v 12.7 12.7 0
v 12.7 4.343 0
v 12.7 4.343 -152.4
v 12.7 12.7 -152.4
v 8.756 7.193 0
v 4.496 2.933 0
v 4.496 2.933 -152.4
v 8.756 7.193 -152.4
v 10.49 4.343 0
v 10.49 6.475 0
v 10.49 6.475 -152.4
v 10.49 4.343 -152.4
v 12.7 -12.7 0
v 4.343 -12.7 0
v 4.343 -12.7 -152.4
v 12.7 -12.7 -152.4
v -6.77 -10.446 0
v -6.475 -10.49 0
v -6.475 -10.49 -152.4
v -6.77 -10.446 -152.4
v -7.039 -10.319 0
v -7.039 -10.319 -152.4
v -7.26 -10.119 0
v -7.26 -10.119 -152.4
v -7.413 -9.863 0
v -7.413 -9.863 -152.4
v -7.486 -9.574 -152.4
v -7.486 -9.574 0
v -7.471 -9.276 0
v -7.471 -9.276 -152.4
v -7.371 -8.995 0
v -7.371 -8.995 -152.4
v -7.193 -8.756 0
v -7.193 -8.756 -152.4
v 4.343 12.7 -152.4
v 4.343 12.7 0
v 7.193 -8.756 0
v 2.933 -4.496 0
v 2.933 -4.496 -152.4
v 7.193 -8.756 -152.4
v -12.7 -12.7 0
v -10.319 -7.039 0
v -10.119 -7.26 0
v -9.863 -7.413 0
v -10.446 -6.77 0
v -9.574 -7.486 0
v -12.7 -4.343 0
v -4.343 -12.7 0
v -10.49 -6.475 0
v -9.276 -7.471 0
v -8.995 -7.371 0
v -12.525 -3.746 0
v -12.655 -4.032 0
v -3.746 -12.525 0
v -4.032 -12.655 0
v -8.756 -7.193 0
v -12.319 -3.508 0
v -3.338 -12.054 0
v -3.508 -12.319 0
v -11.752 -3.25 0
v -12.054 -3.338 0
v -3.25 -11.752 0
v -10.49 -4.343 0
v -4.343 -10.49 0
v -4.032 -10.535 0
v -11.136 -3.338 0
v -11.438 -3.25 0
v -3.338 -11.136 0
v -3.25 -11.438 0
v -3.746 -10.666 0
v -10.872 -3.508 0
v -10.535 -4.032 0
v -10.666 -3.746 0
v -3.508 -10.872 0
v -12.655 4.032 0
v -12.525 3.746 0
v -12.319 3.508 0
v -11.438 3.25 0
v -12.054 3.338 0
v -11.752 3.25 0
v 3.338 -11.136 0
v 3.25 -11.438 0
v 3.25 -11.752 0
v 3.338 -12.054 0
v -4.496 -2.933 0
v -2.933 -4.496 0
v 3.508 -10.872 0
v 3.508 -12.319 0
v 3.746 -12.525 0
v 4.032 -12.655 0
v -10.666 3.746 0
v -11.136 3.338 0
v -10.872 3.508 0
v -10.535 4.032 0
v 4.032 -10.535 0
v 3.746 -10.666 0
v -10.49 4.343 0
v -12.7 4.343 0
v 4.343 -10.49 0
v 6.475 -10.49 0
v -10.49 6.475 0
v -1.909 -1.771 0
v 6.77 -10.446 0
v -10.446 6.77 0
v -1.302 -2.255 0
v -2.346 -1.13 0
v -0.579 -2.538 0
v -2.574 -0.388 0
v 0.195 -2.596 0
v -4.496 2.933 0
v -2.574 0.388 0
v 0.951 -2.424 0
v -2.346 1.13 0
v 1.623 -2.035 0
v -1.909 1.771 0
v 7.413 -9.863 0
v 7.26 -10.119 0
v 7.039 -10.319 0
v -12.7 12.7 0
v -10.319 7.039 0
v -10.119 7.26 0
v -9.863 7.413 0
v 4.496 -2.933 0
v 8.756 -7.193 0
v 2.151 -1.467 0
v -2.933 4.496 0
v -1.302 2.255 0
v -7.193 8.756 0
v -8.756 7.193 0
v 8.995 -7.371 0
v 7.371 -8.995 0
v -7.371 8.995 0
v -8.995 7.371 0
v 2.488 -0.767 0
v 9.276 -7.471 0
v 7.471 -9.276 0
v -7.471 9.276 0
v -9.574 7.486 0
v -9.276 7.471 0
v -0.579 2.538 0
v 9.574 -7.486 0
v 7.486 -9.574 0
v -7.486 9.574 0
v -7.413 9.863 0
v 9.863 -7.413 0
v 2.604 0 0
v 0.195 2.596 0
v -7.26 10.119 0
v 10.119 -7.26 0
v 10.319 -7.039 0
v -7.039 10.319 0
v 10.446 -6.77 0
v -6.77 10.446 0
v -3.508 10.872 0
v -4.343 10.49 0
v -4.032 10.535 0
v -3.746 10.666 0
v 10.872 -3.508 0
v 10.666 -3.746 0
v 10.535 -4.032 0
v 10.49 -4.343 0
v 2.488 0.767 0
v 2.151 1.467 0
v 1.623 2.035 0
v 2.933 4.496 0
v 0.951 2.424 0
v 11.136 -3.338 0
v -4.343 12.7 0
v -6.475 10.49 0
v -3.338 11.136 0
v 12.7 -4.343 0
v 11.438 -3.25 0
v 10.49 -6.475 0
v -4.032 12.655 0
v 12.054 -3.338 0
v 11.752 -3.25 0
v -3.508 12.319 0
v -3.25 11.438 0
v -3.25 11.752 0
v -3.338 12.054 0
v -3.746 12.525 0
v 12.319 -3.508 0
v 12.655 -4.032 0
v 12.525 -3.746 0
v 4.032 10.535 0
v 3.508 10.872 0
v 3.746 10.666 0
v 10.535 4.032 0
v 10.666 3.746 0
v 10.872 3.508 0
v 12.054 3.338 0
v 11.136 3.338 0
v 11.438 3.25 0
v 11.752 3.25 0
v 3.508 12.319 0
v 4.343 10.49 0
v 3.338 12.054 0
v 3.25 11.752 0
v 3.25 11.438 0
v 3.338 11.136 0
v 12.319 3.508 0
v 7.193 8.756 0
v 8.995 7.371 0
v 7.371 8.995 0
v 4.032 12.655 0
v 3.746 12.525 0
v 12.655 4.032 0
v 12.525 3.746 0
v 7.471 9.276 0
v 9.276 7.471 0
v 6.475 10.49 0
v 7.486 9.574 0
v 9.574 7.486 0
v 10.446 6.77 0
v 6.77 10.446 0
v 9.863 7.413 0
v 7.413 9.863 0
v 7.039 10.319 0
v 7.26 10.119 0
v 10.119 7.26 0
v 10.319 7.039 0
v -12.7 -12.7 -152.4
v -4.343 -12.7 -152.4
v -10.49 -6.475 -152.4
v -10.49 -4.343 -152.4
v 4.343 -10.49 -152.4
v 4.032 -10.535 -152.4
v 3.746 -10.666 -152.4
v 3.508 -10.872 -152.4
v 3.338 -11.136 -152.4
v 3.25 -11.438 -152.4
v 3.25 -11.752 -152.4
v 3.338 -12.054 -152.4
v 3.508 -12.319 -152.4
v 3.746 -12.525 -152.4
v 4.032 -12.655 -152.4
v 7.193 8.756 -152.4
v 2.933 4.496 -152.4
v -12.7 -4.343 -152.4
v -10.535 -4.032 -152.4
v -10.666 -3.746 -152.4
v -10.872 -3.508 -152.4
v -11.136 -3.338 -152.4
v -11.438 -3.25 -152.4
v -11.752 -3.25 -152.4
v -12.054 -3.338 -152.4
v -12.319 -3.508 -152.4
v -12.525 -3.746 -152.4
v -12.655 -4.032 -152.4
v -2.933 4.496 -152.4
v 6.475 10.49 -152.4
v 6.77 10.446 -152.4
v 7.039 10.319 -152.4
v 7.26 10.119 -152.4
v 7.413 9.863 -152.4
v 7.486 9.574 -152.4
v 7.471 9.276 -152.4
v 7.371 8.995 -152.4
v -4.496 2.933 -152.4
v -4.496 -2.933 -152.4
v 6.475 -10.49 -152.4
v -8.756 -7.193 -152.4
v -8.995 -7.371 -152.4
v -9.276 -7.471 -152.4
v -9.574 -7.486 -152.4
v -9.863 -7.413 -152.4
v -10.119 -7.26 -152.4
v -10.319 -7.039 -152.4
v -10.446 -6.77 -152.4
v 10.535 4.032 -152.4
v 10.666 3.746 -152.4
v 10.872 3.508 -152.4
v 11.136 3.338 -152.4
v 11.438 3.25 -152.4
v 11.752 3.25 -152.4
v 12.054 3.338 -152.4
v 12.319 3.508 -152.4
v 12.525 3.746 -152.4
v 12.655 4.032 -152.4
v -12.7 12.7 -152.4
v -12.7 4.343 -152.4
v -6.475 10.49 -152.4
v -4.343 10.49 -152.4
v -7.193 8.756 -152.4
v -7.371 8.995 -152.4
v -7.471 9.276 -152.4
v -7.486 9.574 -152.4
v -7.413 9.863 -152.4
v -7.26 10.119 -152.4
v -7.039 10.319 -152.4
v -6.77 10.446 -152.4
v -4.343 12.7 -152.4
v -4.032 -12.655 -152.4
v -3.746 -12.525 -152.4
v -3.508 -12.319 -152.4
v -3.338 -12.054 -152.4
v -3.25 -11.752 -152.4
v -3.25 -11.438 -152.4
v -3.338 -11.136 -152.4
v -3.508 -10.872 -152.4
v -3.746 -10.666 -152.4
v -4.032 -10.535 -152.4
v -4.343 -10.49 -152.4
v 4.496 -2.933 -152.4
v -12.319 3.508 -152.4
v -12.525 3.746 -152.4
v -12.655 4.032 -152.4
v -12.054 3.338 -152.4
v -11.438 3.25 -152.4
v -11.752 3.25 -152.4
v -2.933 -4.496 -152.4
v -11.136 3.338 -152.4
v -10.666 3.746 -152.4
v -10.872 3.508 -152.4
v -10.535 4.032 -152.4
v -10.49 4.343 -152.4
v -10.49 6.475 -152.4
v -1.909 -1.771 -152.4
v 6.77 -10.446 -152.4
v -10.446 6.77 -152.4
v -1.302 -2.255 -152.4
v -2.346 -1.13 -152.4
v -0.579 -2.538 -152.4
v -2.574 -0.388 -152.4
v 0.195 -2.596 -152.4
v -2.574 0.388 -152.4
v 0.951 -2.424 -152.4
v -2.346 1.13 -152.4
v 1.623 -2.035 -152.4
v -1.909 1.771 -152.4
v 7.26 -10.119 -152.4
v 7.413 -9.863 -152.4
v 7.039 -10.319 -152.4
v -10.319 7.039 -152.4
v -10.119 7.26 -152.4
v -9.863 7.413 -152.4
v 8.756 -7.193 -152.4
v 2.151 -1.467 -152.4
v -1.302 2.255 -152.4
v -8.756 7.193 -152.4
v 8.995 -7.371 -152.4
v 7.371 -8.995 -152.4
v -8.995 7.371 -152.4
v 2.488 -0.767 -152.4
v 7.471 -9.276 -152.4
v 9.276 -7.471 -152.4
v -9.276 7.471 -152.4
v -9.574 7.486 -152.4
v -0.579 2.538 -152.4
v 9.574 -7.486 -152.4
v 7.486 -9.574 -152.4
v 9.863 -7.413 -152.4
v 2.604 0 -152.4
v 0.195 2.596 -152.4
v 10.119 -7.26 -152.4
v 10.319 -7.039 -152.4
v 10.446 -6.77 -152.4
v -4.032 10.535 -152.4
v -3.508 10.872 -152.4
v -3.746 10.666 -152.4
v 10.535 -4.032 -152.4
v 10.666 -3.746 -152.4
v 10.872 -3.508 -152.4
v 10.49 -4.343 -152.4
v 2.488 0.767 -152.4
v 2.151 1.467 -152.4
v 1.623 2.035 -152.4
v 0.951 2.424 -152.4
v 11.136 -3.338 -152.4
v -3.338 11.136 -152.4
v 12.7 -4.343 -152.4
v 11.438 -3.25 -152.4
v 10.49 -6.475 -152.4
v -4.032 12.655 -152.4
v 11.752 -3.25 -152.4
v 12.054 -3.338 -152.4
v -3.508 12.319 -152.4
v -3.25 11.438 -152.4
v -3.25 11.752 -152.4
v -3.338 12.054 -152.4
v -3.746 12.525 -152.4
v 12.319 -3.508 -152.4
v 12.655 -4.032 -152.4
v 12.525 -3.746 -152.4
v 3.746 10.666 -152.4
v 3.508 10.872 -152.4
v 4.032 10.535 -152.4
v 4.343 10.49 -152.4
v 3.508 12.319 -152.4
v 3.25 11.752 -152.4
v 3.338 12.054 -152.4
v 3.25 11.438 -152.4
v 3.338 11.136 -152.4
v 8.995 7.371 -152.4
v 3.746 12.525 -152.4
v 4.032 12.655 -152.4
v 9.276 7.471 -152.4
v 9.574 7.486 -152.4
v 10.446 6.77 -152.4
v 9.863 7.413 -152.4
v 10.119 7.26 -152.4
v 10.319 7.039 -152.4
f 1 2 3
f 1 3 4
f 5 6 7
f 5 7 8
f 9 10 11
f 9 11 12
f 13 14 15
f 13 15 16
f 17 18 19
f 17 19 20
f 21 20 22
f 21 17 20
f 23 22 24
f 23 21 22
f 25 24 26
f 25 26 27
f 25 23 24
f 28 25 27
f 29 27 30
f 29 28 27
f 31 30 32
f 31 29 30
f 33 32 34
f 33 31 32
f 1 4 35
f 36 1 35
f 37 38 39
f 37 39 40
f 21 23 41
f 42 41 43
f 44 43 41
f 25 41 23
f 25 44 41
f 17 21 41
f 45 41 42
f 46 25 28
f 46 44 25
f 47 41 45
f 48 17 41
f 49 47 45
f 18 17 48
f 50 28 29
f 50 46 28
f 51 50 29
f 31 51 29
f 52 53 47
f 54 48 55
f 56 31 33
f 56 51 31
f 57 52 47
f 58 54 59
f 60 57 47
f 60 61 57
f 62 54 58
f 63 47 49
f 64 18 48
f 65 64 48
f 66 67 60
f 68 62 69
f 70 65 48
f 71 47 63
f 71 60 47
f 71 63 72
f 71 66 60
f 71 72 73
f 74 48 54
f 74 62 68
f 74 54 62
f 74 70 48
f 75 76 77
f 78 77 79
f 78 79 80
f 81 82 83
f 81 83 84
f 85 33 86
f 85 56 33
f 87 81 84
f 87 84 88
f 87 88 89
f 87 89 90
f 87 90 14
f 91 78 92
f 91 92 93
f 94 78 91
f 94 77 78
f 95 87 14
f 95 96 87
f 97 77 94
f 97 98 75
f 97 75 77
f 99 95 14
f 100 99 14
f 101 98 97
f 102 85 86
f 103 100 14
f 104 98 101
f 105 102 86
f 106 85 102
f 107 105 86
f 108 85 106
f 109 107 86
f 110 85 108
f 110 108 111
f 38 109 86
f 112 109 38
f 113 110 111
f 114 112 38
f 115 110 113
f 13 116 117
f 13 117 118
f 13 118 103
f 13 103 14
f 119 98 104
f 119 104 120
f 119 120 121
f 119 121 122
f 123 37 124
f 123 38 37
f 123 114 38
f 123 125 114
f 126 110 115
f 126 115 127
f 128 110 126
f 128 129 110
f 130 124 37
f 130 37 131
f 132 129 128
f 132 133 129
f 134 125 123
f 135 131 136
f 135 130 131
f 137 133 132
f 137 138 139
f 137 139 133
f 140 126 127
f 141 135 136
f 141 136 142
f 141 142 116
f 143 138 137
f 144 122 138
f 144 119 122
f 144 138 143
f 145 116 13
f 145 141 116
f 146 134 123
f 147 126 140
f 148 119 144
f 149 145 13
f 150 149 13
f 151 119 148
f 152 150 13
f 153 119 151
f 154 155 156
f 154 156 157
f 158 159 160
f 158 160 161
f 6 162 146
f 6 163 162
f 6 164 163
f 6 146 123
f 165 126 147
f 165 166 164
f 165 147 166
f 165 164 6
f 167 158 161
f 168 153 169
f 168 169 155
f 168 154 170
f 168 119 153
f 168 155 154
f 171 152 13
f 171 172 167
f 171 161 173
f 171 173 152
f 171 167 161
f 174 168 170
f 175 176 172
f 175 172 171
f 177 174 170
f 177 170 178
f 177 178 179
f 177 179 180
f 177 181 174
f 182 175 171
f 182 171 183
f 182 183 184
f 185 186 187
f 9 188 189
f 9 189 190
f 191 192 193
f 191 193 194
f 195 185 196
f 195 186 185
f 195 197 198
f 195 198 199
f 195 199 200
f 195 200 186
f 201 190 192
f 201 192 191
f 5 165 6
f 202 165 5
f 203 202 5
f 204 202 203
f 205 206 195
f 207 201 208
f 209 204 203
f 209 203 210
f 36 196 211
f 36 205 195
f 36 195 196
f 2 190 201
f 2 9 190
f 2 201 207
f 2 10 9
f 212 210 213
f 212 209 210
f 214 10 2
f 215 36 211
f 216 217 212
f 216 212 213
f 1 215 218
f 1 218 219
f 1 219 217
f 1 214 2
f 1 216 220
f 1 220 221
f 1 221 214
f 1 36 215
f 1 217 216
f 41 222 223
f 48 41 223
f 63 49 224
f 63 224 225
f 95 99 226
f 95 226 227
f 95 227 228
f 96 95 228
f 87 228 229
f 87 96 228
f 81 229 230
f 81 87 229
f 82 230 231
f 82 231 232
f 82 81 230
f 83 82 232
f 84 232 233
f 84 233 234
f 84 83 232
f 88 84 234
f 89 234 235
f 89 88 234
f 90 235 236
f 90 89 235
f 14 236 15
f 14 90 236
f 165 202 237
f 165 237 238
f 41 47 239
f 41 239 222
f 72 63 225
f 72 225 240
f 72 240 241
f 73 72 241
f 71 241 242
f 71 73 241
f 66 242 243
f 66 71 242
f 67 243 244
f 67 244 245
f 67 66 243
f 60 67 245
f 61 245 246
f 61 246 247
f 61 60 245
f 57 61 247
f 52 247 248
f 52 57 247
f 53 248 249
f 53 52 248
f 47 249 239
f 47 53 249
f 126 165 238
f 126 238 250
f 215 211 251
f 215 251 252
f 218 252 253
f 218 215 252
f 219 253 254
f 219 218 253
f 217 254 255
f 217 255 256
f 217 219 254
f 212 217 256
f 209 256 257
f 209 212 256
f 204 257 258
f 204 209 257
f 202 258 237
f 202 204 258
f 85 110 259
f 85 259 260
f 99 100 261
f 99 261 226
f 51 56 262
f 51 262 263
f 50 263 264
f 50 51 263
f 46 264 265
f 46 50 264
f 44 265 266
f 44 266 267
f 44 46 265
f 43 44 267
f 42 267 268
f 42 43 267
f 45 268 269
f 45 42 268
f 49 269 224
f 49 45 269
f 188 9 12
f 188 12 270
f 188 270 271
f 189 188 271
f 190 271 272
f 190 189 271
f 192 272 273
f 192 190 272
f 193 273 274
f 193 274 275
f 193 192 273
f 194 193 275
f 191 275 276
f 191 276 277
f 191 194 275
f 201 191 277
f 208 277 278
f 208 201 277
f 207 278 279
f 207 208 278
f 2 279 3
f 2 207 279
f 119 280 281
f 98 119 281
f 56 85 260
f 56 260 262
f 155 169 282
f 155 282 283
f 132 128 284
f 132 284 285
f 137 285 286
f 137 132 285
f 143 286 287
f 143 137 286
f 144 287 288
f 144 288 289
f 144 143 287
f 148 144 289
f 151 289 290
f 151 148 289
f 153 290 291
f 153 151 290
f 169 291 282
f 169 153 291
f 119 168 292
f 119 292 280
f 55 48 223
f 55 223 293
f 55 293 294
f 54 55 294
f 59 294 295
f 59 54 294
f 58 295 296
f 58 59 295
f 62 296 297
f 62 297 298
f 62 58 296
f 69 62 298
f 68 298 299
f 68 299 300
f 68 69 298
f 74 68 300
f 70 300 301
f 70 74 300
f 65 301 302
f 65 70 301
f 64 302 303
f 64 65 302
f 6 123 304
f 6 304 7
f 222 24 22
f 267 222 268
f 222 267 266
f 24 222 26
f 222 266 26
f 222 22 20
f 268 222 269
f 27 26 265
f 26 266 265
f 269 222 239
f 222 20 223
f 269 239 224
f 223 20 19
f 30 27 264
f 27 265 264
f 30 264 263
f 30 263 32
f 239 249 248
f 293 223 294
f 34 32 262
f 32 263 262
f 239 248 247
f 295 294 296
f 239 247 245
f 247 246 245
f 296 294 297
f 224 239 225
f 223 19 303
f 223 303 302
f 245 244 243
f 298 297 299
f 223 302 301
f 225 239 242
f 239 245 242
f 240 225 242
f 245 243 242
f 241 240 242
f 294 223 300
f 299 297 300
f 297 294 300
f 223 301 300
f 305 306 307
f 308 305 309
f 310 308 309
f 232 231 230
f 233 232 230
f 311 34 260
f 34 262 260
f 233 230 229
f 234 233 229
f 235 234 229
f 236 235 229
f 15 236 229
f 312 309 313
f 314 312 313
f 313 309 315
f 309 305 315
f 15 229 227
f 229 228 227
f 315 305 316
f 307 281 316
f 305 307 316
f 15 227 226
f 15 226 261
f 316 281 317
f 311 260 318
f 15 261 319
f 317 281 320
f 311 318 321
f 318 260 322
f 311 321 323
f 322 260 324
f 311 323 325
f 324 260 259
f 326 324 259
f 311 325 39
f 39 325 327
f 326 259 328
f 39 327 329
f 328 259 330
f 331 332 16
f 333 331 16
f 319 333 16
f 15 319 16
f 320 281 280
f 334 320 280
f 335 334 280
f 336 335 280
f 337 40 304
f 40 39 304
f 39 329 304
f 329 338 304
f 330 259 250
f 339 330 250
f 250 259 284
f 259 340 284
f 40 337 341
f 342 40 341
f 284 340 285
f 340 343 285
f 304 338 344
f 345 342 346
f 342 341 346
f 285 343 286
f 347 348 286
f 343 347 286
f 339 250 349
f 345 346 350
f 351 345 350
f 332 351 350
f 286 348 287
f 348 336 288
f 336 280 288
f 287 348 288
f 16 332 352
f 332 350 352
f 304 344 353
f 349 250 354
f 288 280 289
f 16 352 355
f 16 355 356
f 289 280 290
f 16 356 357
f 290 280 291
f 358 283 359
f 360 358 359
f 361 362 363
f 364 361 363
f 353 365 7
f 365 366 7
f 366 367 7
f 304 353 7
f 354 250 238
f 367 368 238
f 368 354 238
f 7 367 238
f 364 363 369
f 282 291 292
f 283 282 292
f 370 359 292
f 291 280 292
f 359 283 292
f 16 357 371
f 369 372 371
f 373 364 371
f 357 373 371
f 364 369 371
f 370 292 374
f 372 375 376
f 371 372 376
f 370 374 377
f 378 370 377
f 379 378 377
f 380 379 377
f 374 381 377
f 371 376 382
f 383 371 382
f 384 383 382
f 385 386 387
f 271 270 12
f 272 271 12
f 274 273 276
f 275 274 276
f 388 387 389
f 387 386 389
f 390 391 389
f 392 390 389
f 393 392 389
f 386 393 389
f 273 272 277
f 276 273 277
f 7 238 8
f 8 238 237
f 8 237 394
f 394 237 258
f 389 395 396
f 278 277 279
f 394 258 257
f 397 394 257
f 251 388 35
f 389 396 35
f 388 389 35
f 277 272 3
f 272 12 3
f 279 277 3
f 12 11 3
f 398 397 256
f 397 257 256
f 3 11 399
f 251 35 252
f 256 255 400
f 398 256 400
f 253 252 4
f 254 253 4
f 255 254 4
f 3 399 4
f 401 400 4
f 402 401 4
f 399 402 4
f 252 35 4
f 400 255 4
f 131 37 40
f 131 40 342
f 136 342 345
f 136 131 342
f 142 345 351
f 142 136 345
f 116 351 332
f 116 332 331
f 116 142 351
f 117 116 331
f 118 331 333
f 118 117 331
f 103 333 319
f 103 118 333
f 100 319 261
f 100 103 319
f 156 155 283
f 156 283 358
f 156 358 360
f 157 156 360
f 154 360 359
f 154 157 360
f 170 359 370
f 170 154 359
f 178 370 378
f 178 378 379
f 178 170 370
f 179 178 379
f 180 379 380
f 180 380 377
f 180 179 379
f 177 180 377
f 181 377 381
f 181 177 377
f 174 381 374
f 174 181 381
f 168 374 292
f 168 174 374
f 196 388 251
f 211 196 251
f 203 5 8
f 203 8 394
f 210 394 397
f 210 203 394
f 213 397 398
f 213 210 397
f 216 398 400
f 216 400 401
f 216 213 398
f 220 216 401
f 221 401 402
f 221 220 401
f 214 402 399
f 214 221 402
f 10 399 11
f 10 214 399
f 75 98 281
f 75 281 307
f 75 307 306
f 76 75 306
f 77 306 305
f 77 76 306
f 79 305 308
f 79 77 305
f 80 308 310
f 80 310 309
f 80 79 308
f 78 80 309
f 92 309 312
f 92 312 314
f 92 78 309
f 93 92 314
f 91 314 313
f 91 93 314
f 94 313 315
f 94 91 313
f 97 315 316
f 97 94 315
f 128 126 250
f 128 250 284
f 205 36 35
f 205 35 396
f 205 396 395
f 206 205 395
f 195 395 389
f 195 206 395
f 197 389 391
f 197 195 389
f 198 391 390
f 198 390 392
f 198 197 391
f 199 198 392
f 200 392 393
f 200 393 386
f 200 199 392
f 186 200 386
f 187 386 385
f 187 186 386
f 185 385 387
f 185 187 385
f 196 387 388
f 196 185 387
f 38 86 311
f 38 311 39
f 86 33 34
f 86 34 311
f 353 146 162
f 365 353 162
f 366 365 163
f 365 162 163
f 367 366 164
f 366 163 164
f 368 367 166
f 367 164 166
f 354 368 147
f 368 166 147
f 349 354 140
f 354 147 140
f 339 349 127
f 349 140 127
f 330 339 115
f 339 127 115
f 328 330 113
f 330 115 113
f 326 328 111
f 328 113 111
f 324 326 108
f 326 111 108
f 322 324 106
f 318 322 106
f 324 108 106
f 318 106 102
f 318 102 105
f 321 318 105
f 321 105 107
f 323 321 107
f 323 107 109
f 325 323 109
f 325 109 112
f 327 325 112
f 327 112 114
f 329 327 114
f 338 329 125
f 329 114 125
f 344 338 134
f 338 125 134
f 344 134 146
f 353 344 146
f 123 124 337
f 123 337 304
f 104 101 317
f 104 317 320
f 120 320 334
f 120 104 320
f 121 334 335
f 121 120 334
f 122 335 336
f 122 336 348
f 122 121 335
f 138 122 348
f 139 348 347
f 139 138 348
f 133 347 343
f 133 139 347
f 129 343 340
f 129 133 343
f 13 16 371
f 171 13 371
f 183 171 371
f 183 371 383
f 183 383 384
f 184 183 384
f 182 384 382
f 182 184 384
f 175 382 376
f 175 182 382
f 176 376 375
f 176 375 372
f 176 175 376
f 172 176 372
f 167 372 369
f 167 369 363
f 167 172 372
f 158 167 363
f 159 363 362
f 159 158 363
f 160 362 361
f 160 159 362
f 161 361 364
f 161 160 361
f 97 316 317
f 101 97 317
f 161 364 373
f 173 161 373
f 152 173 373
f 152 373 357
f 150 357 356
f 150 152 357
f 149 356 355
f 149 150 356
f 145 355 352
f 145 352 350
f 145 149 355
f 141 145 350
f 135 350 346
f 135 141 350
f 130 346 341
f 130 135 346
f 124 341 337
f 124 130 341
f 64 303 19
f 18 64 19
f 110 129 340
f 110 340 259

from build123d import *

# Parameters (mm, degrees)
SKETCH1_R           = 2.6035
BOSS_EXTRUDE1_DEPTH = 152.4


with BuildPart() as part:
    # Sketch1 → Boss-Extrude1 (new body)
    with BuildSketch(Plane.XY):
        with BuildLine():
            Line((-12.7, -12.7), (-4.343399971, -12.7))
            ThreePointArc((-4.343399971, -12.7), (-3.238499971, -11.5951), (-4.343399971, -10.4902))
            Line((-4.343399971, -10.4902), (-6.474794456, -10.4902))
            ThreePointArc((-6.474794456, -10.4902), (-7.413456061, -9.863006367), (-7.193214945, -8.75577951))
            Line((-7.193214945, -8.75577951), (-2.933235435, -4.4958))
            Line((-2.933235435, -4.4958), (2.933235435, -4.4958))
            Line((2.933235435, -4.4958), (7.193214945, -8.75577951))
            ThreePointArc((7.193214945, -8.75577951), (7.413456061, -9.863006367), (6.474794456, -10.4902))
            Line((6.474794456, -10.4902), (4.3434, -10.4902))
            ThreePointArc((4.3434, -10.4902), (3.2385, -11.5951), (4.3434, -12.7))
            Line((4.3434, -12.7), (12.7, -12.7))
            Line((12.7, -12.7), (12.7, -4.343399971))
            ThreePointArc((12.7, -4.343399971), (11.5951, -3.238499971), (10.4902, -4.343399971))
            Line((10.4902, -4.343399971), (10.4902, -6.474794456))
            ThreePointArc((10.4902, -6.474794456), (9.863006367, -7.413456061), (8.75577951, -7.193214945))
            Line((8.75577951, -7.193214945), (4.4958, -2.933235435))
            Line((4.4958, -2.933235435), (4.4958, 2.933235435))
            Line((4.4958, 2.933235435), (8.75577951, 7.193214945))
            ThreePointArc((8.75577951, 7.193214945), (9.863006367, 7.413456061), (10.4902, 6.474794456))
            Line((10.4902, 6.474794456), (10.4902, 4.3434))
            ThreePointArc((10.4902, 4.3434), (11.5951, 3.2385), (12.7, 4.3434))
            Line((12.7, 4.3434), (12.7, 12.7))
            Line((12.7, 12.7), (4.343399971, 12.7))
            ThreePointArc((4.343399971, 12.7), (3.238499971, 11.5951), (4.343399971, 10.4902))
            Line((4.343399971, 10.4902), (6.474794456, 10.4902))
            ThreePointArc((6.474794456, 10.4902), (7.413456061, 9.863006367), (7.193214945, 8.75577951))
            Line((7.193214945, 8.75577951), (2.933235435, 4.4958))
            Line((2.933235435, 4.4958), (-2.933235435, 4.4958))
            Line((-2.933235435, 4.4958), (-7.193214945, 8.75577951))
            ThreePointArc((-7.193214945, 8.75577951), (-7.413456061, 9.863006367), (-6.474794456, 10.4902))
            Line((-6.474794456, 10.4902), (-4.3434, 10.4902))
            ThreePointArc((-4.3434, 10.4902), (-3.2385, 11.5951), (-4.3434, 12.7))
            Line((-4.3434, 12.7), (-12.7, 12.7))
            Line((-12.7, 12.7), (-12.7, 4.343399971))
            ThreePointArc((-12.7, 4.343399971), (-11.5951, 3.238499971), (-10.4902, 4.343399971))
            Line((-10.4902, 4.343399971), (-10.4902, 6.474794456))
            ThreePointArc((-10.4902, 6.474794456), (-9.863006367, 7.413456061), (-8.75577951, 7.193214945))
            Line((-8.75577951, 7.193214945), (-4.4958, 2.933235435))
            Line((-4.4958, 2.933235435), (-4.4958, -2.933235435))
            Line((-4.4958, -2.933235435), (-8.75577951, -7.193214945))
            ThreePointArc((-8.75577951, -7.193214945), (-9.863006367, -7.413456061), (-10.4902, -6.474794456))
            Line((-10.4902, -6.474794456), (-10.4902, -4.3434))
            ThreePointArc((-10.4902, -4.3434), (-11.5951, -3.2385), (-12.7, -4.3434))
            Line((-12.7, -4.3434), (-12.7, -12.7))
        make_face()
        Circle(SKETCH1_R, mode=Mode.SUBTRACT)
    extrude(amount=-BOSS_EXTRUDE1_DEPTH)


solid = part.part
